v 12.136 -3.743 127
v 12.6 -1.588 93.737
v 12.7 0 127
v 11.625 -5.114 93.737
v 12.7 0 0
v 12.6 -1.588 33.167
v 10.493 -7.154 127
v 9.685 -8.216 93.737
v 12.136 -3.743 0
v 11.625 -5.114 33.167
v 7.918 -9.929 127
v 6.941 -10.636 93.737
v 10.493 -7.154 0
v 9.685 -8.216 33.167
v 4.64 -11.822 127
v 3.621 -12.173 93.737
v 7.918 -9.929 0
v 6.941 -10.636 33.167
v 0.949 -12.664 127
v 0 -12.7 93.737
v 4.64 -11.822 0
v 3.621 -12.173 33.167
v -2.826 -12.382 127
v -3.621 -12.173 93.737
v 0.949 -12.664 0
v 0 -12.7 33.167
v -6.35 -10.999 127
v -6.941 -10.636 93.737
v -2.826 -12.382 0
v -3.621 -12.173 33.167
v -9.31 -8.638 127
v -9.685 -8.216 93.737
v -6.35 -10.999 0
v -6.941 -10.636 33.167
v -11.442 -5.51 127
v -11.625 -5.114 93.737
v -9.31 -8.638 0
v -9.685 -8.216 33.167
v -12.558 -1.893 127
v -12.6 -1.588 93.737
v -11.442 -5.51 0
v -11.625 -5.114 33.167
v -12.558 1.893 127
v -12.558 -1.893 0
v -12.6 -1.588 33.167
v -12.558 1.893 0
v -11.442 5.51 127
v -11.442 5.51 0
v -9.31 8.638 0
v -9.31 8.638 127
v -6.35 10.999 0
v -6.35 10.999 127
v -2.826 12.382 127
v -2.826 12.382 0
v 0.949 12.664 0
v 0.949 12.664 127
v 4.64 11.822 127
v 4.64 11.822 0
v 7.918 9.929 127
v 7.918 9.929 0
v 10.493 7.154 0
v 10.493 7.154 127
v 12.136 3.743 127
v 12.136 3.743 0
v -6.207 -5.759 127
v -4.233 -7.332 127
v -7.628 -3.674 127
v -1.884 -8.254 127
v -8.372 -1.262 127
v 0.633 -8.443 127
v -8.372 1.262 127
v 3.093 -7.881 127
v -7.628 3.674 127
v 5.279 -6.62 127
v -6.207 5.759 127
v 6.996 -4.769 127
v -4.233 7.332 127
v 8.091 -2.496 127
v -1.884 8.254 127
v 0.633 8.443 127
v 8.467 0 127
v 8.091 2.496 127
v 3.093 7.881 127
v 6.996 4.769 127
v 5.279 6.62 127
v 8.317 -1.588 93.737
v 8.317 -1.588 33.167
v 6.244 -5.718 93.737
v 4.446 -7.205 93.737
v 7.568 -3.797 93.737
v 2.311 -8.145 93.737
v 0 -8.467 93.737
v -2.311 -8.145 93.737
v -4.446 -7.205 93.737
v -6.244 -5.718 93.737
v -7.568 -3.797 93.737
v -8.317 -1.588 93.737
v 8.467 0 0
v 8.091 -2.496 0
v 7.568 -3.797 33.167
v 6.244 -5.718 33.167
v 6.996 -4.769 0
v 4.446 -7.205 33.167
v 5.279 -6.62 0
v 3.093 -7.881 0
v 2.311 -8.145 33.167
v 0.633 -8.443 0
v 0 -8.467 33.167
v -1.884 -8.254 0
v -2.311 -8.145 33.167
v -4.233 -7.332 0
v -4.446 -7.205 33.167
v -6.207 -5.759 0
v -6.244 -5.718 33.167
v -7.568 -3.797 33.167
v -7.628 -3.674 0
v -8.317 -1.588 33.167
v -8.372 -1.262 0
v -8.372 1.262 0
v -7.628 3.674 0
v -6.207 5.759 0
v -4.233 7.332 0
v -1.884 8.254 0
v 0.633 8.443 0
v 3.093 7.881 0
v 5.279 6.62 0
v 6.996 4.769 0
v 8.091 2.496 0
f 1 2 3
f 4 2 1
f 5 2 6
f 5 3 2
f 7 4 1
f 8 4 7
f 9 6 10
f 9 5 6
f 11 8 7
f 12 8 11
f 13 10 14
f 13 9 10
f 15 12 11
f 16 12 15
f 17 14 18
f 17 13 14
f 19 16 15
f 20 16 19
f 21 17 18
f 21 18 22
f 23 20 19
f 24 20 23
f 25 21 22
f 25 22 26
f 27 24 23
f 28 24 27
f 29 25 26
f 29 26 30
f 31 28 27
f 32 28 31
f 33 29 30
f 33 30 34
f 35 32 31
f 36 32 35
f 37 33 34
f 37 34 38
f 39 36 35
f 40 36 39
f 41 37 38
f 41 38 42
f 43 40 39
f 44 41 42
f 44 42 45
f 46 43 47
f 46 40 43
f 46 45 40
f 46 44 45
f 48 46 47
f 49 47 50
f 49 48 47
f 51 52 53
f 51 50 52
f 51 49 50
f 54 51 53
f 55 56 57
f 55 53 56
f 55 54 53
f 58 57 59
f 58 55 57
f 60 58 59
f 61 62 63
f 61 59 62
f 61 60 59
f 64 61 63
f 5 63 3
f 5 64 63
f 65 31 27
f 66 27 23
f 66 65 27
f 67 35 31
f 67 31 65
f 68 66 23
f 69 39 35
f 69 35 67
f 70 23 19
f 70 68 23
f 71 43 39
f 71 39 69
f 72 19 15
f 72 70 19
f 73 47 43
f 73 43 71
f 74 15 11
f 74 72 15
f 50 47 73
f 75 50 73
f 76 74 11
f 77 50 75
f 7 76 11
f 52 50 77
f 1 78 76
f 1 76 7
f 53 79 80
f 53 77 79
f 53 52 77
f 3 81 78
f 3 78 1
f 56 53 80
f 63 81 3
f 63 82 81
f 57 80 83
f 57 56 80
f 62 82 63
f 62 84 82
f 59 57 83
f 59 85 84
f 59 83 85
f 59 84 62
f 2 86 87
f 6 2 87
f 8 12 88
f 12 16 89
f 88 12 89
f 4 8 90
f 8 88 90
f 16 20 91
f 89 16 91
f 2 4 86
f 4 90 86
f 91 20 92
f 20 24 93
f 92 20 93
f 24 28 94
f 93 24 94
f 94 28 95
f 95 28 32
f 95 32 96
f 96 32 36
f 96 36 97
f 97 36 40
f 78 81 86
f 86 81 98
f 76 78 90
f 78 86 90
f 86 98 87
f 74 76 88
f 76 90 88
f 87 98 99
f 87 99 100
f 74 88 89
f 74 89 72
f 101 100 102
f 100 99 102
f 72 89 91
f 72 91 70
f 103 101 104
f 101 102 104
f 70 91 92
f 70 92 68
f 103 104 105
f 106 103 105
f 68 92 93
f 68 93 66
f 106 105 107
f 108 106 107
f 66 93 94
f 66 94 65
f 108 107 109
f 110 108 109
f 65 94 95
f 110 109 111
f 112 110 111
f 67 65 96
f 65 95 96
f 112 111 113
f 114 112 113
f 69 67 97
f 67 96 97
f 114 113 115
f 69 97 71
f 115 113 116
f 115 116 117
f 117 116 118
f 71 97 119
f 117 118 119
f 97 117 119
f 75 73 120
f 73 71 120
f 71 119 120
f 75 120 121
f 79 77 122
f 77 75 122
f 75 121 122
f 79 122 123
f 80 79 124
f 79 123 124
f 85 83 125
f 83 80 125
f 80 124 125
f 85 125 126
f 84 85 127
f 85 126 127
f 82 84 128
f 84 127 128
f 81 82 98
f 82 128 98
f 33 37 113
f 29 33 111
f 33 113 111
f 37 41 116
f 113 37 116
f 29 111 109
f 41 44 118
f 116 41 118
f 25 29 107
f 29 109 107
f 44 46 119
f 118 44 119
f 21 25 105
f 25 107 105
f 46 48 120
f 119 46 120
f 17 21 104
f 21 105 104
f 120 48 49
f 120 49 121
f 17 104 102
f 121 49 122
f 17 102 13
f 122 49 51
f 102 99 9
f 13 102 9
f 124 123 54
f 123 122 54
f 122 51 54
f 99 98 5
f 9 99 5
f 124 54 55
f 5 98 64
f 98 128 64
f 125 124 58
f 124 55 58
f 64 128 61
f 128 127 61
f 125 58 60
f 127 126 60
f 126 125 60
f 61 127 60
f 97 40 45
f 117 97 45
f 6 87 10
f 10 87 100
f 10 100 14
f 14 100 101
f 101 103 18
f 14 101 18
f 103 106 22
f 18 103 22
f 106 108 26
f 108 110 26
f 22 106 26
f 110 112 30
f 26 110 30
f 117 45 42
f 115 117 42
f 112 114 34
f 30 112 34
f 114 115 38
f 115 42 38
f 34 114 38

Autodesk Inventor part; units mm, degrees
ref_plane "YZ Plane" through (0, 0, 0) normal (1, 0, 0) x (0, 1, 0)
ref_plane "XZ Plane" through (0, 0, 0) normal (0, 1, 0) x (-1, 0, 0)
ref_plane "XY Plane" through (0, 0, 0) normal (0, 0, 1) x (1, 0, 0)
sketch "Sketch1" plane through (0, 0, 0) normal (0, 0, 1) x (1, 0, 0)
  circle A0 centre (0, 0) radius 8.4667
  circle A1 centre (0, 0) radius 12.7
  dimension "d4" = 25.4
extrude "Extrusion1" add sketch "Sketch1" along normal blind 127
sketch "Sketch2" plane through (0, 0, 0) normal (1, 0, 0) x (0, 1, 0)
  line L0 (-15.1143, 93.7374) -> (-1.5875, 93.7374)
  line L1 (-1.5875, 93.7374) -> (-1.5875, 33.1667)
  line L2 (-1.5875, 33.1667) -> (-15.1143, 33.1667)
  line L3 (-15.1143, 33.1667) -> (-15.1143, 93.7374)
  point P0 (0, 0)
extrude "Extrusion2" cut sketch "Sketch2" along normal mid plane 76.2
properties part number "WireCounterPiece2"
